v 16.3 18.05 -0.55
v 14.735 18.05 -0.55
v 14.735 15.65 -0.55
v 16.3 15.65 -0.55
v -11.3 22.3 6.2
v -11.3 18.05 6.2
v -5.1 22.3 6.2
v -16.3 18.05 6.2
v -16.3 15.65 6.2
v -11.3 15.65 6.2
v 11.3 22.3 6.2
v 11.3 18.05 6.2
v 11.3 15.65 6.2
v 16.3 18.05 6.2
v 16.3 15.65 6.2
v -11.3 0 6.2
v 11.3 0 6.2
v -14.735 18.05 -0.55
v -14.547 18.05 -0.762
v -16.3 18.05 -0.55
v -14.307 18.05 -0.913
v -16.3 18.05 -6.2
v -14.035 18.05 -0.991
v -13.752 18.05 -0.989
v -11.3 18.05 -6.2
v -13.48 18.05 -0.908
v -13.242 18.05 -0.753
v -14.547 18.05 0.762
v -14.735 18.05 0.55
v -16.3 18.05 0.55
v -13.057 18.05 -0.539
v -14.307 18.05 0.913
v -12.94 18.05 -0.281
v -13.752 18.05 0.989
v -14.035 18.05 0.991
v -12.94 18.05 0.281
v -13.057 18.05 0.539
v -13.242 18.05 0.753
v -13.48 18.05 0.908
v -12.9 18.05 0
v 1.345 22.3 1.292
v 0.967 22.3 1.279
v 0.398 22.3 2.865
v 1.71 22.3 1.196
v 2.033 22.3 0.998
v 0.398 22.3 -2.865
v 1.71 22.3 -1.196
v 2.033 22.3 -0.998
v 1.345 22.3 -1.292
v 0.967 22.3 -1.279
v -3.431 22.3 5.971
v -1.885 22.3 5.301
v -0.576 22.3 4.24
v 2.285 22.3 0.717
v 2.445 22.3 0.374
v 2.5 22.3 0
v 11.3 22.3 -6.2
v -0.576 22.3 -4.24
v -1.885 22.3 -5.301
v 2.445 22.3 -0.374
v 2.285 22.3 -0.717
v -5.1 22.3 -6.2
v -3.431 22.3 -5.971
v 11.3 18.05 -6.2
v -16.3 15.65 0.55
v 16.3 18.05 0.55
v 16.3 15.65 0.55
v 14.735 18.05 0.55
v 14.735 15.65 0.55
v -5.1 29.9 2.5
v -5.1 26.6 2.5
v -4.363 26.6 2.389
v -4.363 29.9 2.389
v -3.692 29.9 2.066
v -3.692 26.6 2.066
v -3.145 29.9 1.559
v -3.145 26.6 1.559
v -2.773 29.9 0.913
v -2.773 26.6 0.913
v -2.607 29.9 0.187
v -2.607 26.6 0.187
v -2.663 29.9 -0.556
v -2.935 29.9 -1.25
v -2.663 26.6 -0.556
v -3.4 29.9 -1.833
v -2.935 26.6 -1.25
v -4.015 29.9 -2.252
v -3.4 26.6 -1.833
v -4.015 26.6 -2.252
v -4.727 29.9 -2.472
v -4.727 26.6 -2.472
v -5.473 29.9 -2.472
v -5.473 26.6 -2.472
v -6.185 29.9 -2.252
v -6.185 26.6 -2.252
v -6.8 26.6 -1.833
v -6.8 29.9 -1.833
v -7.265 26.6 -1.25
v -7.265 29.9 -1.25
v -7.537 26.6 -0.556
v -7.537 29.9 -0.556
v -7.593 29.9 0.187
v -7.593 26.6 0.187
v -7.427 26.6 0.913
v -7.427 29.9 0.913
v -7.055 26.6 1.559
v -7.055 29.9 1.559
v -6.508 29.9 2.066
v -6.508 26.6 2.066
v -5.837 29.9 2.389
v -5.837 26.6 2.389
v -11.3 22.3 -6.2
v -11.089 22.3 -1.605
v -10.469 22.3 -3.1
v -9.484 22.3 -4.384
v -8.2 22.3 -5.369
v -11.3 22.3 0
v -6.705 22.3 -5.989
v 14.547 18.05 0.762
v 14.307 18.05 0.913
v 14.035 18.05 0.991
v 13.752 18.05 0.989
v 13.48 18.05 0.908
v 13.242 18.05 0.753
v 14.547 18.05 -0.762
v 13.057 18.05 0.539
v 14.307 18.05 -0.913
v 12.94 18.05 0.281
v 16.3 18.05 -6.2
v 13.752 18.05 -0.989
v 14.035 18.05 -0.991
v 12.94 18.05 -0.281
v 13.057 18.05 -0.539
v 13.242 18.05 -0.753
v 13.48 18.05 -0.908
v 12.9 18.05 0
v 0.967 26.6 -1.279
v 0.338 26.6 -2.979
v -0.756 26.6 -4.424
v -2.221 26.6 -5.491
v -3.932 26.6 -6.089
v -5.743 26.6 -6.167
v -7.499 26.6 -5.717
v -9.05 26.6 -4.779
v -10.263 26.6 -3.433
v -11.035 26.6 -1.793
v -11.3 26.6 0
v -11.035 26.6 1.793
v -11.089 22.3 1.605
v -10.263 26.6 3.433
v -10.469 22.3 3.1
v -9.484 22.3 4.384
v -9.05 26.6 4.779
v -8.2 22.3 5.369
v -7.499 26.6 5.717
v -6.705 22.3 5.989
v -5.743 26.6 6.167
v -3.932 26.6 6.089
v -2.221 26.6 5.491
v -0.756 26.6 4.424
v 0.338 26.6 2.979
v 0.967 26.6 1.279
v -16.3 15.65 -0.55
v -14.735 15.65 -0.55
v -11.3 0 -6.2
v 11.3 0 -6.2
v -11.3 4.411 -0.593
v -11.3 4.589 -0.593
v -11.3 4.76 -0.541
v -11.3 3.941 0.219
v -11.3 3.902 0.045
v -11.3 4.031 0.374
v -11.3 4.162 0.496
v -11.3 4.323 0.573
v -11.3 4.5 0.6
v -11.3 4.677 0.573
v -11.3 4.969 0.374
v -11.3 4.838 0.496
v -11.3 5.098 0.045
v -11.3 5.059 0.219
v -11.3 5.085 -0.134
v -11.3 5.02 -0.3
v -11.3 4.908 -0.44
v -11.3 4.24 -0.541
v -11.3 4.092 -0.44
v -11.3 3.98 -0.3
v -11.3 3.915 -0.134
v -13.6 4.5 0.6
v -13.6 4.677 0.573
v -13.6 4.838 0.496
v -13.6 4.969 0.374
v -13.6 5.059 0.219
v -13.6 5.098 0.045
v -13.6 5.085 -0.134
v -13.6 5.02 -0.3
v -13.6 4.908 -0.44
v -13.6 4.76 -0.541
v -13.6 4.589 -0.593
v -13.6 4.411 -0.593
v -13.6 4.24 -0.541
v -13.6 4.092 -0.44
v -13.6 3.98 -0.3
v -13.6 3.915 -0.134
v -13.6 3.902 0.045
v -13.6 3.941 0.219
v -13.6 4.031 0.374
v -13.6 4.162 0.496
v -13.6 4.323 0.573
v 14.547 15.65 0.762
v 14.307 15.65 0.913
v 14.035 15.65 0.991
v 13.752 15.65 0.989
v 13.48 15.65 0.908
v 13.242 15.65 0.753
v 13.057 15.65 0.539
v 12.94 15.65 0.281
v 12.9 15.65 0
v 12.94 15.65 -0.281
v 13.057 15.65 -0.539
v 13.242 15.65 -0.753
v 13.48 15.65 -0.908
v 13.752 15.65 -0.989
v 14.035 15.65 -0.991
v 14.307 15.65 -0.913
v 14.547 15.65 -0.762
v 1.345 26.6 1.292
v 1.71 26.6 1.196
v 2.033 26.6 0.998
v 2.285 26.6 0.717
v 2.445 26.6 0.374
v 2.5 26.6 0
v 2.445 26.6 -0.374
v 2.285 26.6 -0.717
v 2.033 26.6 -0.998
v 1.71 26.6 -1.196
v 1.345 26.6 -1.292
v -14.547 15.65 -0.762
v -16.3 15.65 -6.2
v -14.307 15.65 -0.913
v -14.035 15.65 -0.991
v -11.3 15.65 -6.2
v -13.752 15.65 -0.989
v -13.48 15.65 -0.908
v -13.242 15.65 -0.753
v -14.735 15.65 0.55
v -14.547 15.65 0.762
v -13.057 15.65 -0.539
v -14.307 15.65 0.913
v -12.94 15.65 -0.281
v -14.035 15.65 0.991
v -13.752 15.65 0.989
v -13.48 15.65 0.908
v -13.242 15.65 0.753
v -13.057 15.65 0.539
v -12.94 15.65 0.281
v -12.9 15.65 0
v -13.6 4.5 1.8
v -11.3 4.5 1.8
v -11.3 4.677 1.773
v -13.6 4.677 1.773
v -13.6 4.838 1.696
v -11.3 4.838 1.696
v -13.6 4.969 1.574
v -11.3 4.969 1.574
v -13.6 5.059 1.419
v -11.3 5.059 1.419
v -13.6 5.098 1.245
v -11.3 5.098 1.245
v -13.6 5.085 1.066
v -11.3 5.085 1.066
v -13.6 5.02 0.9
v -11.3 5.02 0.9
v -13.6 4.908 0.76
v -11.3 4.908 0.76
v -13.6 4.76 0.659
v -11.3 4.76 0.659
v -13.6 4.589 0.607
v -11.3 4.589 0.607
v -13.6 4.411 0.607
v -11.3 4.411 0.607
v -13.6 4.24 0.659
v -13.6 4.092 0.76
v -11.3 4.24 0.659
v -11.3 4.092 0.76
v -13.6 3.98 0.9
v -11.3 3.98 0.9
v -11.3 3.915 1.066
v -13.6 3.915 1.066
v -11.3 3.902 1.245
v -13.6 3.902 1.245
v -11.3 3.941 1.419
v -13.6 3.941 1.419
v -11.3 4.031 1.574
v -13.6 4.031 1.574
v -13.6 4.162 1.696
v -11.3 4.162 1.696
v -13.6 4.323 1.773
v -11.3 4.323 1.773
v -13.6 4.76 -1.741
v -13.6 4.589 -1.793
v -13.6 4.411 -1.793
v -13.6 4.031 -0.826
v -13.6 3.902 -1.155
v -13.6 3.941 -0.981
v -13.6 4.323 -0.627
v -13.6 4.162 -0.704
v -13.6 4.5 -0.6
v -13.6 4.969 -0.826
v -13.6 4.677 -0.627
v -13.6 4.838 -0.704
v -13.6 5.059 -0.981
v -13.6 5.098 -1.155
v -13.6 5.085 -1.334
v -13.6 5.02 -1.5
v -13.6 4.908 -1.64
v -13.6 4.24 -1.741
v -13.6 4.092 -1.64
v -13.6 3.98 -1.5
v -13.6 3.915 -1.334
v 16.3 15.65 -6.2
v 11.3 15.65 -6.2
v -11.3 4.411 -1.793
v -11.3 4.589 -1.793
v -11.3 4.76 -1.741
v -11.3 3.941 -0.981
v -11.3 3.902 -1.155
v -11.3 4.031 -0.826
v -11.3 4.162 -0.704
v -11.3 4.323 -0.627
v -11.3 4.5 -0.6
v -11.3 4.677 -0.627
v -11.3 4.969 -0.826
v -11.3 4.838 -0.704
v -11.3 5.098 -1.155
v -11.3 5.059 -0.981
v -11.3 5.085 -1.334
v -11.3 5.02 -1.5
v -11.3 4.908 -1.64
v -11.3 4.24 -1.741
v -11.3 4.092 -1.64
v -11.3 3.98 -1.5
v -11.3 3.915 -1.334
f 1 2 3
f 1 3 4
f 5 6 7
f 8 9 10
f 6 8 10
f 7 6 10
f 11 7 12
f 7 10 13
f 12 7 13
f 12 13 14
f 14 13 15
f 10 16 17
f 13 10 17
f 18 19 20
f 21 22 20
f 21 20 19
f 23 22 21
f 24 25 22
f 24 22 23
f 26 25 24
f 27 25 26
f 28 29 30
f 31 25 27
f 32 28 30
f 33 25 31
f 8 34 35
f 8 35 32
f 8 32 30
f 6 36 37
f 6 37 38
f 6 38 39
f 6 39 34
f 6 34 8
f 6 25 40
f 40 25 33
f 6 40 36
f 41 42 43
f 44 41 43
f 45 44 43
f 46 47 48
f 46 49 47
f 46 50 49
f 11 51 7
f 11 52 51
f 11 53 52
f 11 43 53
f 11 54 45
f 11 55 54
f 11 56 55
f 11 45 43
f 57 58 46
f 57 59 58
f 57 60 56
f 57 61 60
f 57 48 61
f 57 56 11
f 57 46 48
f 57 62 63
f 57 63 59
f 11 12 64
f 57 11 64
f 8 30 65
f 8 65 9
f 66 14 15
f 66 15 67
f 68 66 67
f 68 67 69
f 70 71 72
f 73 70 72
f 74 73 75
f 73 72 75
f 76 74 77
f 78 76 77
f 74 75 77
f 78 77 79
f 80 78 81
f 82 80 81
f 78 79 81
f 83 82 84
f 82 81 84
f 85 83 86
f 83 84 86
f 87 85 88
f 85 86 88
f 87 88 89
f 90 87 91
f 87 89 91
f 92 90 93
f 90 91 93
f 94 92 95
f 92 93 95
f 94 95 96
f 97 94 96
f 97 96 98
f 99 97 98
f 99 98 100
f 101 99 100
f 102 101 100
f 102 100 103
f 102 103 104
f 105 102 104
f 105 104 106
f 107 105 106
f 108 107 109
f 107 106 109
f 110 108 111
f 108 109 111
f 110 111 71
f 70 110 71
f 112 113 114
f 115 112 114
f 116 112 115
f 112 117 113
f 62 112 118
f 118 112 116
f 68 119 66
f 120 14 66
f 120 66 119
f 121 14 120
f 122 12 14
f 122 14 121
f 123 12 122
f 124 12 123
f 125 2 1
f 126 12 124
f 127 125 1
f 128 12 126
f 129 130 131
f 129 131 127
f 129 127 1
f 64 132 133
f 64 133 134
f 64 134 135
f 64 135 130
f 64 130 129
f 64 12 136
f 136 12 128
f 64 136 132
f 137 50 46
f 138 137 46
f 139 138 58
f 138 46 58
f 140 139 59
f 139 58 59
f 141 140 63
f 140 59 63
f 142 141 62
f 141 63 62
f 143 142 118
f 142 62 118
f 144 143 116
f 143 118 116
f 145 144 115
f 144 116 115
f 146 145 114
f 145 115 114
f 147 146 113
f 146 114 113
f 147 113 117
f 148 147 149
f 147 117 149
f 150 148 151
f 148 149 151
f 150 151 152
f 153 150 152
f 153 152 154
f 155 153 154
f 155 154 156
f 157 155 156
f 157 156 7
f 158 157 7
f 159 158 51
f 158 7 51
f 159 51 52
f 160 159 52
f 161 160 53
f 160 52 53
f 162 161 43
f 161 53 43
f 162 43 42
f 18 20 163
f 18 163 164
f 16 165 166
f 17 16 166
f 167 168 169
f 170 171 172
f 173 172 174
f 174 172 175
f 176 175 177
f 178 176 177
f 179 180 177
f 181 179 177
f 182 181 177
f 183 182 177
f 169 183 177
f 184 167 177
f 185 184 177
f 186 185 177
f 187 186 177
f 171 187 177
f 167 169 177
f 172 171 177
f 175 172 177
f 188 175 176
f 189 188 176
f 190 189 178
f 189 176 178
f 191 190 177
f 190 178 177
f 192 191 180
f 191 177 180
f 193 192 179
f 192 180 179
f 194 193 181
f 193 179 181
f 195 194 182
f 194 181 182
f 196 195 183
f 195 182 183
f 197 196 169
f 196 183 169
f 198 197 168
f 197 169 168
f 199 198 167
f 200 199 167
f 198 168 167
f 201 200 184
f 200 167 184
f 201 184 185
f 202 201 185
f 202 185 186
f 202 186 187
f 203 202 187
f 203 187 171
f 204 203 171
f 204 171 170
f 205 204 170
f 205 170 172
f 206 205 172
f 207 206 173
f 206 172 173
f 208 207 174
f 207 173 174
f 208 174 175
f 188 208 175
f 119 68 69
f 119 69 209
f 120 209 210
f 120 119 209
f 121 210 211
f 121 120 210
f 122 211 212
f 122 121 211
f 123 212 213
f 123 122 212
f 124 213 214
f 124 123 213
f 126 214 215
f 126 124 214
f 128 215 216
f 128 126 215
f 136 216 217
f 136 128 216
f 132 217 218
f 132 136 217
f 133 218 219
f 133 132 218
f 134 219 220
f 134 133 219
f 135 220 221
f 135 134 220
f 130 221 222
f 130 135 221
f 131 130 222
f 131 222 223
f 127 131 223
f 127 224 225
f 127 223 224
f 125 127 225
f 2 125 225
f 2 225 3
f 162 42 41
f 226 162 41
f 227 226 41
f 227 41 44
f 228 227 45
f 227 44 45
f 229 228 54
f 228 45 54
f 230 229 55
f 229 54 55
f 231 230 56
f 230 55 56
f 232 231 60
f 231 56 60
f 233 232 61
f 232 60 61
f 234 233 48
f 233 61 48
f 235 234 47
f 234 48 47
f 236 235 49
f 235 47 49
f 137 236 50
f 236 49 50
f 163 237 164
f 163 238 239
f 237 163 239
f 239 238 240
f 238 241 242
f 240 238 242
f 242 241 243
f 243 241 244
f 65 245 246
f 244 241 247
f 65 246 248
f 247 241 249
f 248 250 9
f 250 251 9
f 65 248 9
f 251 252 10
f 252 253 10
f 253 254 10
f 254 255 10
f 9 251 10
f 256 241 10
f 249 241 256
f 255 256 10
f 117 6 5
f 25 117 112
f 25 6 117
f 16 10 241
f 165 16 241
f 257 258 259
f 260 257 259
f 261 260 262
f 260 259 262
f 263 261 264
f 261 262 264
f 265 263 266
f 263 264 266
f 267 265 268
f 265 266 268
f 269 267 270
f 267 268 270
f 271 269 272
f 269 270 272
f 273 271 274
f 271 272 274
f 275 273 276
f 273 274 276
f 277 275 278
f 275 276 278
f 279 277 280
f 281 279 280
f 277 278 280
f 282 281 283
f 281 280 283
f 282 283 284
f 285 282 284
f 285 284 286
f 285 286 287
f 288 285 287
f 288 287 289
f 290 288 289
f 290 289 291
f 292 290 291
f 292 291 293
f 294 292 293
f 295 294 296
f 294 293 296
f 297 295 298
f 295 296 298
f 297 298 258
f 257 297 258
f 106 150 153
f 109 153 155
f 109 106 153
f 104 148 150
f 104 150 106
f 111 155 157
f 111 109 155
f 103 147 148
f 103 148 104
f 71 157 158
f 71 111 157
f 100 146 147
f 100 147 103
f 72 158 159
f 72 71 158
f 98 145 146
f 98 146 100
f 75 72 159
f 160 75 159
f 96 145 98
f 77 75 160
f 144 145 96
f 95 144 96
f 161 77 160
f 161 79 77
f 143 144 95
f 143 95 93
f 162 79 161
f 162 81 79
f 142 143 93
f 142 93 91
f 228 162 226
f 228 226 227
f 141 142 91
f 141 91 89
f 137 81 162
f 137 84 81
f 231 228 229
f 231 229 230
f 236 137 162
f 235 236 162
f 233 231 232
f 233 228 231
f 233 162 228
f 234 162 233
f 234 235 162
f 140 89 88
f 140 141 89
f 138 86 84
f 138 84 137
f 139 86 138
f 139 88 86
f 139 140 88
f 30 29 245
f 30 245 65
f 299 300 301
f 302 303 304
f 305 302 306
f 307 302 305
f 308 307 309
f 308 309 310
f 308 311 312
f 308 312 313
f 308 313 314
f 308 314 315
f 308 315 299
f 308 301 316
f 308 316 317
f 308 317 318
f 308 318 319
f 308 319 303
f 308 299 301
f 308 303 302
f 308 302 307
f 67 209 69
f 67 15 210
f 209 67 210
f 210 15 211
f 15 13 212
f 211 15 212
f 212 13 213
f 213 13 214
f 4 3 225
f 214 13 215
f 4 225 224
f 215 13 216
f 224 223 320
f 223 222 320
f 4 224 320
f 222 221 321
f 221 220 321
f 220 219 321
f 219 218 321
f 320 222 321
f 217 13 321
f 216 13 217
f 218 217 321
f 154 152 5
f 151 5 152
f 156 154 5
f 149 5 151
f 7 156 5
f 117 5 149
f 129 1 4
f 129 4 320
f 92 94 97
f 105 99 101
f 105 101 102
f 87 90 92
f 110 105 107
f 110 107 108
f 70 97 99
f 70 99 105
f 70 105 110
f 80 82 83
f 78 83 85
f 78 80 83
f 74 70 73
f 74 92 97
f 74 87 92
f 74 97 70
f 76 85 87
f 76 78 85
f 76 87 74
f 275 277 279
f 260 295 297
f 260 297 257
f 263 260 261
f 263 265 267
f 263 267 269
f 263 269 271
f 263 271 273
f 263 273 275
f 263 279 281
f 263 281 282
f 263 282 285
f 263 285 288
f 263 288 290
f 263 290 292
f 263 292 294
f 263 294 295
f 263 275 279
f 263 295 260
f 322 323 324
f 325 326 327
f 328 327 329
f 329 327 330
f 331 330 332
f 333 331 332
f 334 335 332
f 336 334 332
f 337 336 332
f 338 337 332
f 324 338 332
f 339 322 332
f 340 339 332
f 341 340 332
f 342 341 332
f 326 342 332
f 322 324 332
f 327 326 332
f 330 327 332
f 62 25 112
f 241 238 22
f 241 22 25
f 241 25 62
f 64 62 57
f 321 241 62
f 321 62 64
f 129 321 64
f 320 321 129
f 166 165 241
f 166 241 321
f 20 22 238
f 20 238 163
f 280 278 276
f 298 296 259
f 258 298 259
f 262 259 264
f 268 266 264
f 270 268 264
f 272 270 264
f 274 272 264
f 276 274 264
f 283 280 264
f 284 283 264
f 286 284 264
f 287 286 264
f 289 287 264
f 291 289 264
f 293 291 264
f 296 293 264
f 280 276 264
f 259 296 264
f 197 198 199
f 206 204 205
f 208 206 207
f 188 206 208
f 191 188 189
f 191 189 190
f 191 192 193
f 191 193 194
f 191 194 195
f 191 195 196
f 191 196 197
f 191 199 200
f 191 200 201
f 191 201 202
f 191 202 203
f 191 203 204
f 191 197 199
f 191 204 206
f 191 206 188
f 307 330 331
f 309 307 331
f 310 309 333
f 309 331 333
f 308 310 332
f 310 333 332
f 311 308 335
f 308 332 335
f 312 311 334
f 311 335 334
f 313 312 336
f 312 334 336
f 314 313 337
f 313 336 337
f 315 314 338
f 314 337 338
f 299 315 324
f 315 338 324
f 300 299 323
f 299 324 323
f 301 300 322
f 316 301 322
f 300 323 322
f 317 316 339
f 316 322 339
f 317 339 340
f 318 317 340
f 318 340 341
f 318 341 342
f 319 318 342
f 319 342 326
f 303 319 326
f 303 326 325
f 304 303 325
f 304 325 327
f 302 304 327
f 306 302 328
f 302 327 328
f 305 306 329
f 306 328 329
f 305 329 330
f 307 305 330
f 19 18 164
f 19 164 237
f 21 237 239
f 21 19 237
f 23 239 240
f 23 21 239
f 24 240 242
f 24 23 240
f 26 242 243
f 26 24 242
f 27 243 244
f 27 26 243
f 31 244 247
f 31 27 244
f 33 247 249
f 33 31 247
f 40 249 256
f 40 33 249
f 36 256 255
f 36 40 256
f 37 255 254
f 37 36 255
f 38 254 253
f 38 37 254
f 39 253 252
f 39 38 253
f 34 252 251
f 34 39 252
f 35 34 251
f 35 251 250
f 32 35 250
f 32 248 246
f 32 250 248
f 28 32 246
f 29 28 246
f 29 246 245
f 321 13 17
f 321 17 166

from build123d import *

# Parameters (mm, degrees)
SKETCH1_W             = 22.6
SKETCH1_H             = 12.4
BOSS_EXTRUDE1_DEPTH   = 22.3
SKETCH2_W             = 12.4
SKETCH2_H             = 2.4
BOSS_EXTRUDE2_DEPTH   = 5
SKETCH3_W             = 12.4
SKETCH3_H             = 2.4
BOSS_EXTRUDE3_DEPTH   = 5
CUT_EXTRUDE1_REACH    = 27.098
BOSS_EXTRUDE4_DEPTH   = 4.3
SKETCH7_R             = 2.5
BOSS_EXTRUDE5_DEPTH   = 3.3
SKETCH8_R             = 0.6
BOSS_EXTRUDE7_DEPTH   = 2.3
BOSS_EXTRUDE7_2_DEPTH = 2.3
BOSS_EXTRUDE7_3_DEPTH = 2.3


with BuildPart() as part:
    # Sketch1 → Boss-Extrude1 (new body)
    with BuildSketch(Plane(origin=(0, 0, 0), x_dir=(1, 0, 0), z_dir=(0, 1, 0))):
        Rectangle(SKETCH1_W, SKETCH1_H)
    extrude(amount=BOSS_EXTRUDE1_DEPTH)

    # Sketch2 → Boss-Extrude2 (add)
    with BuildSketch(Plane(origin=(11.3, 0, 0), x_dir=(0, 0, -1), z_dir=(1, 0, 0))):
        with Locations((0, 16.85)):
            Rectangle(SKETCH2_W, SKETCH2_H)
    extrude(amount=BOSS_EXTRUDE2_DEPTH)

    # Sketch3 → Boss-Extrude3 (add)
    with BuildSketch(Plane.ZY.offset(11.3)):
        with Locations((0, 16.85)):
            Rectangle(SKETCH3_W, SKETCH3_H)
    extrude(amount=BOSS_EXTRUDE3_DEPTH)

    # Sketch4 → Cut-Extrude1 (cut, up to next)
    with BuildSketch(Plane(origin=(0, 18.05, 0), x_dir=(1, 0, 0), z_dir=(0, 1, 0)), mode=Mode.PRIVATE) as cut_extrude1_sk1:
        with BuildLine():
            Line((-16.3, 0.55), (-14.735164654, 0.55))
            ThreePointArc((-14.735164654, 0.55), (-12.9, 0), (-14.735164654, -0.55))
            Line((-14.735164654, -0.55), (-16.3, -0.55))
            Line((-16.3, -0.55), (-16.3, 0.55))
        make_face()
    cut_extrude1_tool1 = extrude(cut_extrude1_sk1.sketch, amount=-CUT_EXTRUDE1_REACH, mode=Mode.PRIVATE) & part.part
    # Sketch4 → Cut-Extrude1 (cut, up to next)
    with BuildSketch(Plane(origin=(0, 18.05, 0), x_dir=(1, 0, 0), z_dir=(0, 1, 0)), mode=Mode.PRIVATE) as cut_extrude1_sk2:
        with BuildLine():
            Line((16.3, -0.55), (14.735164654, -0.55))
            ThreePointArc((14.735164654, -0.55), (12.9, 0), (14.735164654, 0.55))
            Line((14.735164654, 0.55), (16.3, 0.55))
            Line((16.3, 0.55), (16.3, -0.55))
        make_face()
    cut_extrude1_tool2 = extrude(cut_extrude1_sk2.sketch, amount=-CUT_EXTRUDE1_REACH, mode=Mode.PRIVATE) & part.part
    add(cut_extrude1_tool1.solids().sort_by_distance((-14.464034, 18.05, 0))[0], mode=Mode.SUBTRACT)
    add(cut_extrude1_tool2.solids().sort_by_distance((14.464034, 18.05, 0))[0], mode=Mode.SUBTRACT)

    # Sketch6 → Boss-Extrude4 (add)
    with BuildSketch(Plane(origin=(0, 22.3, 0), x_dir=(1, 0, 0), z_dir=(0, 1, 0))):
        with BuildLine():
            ThreePointArc((0.966666667, -1.278888406), (2.5, 0), (0.966666667, 1.278888406))
            ThreePointArc((0.966666667, 1.278888406), (-11.3, 0), (0.966666667, -1.278888406))
        make_face()
    extrude(amount=BOSS_EXTRUDE4_DEPTH)

    # Sketch7 → Boss-Extrude5 (add)
    with BuildSketch(Plane(origin=(0, 26.6, 0), x_dir=(1, 0, 0), z_dir=(0, 1, 0))):
        with Locations(Location((-5.1, 0, 0), (0, 0, 270))):
            Circle(SKETCH7_R)
    extrude(amount=BOSS_EXTRUDE5_DEPTH)


with BuildPart() as body_2:
    # Sketch8 → Boss-Extrude7 (new body)
    with BuildSketch(Plane.ZY.offset(11.3)):
        with Locations((0, 4.5)):
            Circle(SKETCH8_R)
    extrude(amount=BOSS_EXTRUDE7_DEPTH)


with BuildPart() as body_3:
    # Sketch8 → Boss-Extrude7 2 (new body)
    with BuildSketch(Plane.ZY.offset(11.3)):
        with Locations((-1.2, 4.5)):
            Circle(SKETCH8_R)
    extrude(amount=BOSS_EXTRUDE7_2_DEPTH)


with BuildPart() as body_4:
    # Sketch8 → Boss-Extrude7 3 (new body)
    with BuildSketch(Plane.ZY.offset(11.3)):
        with Locations((1.2, 4.5)):
            Circle(SKETCH8_R)
    extrude(amount=BOSS_EXTRUDE7_3_DEPTH)


solid = Compound([part.part, body_2.part, body_3.part, body_4.part])
